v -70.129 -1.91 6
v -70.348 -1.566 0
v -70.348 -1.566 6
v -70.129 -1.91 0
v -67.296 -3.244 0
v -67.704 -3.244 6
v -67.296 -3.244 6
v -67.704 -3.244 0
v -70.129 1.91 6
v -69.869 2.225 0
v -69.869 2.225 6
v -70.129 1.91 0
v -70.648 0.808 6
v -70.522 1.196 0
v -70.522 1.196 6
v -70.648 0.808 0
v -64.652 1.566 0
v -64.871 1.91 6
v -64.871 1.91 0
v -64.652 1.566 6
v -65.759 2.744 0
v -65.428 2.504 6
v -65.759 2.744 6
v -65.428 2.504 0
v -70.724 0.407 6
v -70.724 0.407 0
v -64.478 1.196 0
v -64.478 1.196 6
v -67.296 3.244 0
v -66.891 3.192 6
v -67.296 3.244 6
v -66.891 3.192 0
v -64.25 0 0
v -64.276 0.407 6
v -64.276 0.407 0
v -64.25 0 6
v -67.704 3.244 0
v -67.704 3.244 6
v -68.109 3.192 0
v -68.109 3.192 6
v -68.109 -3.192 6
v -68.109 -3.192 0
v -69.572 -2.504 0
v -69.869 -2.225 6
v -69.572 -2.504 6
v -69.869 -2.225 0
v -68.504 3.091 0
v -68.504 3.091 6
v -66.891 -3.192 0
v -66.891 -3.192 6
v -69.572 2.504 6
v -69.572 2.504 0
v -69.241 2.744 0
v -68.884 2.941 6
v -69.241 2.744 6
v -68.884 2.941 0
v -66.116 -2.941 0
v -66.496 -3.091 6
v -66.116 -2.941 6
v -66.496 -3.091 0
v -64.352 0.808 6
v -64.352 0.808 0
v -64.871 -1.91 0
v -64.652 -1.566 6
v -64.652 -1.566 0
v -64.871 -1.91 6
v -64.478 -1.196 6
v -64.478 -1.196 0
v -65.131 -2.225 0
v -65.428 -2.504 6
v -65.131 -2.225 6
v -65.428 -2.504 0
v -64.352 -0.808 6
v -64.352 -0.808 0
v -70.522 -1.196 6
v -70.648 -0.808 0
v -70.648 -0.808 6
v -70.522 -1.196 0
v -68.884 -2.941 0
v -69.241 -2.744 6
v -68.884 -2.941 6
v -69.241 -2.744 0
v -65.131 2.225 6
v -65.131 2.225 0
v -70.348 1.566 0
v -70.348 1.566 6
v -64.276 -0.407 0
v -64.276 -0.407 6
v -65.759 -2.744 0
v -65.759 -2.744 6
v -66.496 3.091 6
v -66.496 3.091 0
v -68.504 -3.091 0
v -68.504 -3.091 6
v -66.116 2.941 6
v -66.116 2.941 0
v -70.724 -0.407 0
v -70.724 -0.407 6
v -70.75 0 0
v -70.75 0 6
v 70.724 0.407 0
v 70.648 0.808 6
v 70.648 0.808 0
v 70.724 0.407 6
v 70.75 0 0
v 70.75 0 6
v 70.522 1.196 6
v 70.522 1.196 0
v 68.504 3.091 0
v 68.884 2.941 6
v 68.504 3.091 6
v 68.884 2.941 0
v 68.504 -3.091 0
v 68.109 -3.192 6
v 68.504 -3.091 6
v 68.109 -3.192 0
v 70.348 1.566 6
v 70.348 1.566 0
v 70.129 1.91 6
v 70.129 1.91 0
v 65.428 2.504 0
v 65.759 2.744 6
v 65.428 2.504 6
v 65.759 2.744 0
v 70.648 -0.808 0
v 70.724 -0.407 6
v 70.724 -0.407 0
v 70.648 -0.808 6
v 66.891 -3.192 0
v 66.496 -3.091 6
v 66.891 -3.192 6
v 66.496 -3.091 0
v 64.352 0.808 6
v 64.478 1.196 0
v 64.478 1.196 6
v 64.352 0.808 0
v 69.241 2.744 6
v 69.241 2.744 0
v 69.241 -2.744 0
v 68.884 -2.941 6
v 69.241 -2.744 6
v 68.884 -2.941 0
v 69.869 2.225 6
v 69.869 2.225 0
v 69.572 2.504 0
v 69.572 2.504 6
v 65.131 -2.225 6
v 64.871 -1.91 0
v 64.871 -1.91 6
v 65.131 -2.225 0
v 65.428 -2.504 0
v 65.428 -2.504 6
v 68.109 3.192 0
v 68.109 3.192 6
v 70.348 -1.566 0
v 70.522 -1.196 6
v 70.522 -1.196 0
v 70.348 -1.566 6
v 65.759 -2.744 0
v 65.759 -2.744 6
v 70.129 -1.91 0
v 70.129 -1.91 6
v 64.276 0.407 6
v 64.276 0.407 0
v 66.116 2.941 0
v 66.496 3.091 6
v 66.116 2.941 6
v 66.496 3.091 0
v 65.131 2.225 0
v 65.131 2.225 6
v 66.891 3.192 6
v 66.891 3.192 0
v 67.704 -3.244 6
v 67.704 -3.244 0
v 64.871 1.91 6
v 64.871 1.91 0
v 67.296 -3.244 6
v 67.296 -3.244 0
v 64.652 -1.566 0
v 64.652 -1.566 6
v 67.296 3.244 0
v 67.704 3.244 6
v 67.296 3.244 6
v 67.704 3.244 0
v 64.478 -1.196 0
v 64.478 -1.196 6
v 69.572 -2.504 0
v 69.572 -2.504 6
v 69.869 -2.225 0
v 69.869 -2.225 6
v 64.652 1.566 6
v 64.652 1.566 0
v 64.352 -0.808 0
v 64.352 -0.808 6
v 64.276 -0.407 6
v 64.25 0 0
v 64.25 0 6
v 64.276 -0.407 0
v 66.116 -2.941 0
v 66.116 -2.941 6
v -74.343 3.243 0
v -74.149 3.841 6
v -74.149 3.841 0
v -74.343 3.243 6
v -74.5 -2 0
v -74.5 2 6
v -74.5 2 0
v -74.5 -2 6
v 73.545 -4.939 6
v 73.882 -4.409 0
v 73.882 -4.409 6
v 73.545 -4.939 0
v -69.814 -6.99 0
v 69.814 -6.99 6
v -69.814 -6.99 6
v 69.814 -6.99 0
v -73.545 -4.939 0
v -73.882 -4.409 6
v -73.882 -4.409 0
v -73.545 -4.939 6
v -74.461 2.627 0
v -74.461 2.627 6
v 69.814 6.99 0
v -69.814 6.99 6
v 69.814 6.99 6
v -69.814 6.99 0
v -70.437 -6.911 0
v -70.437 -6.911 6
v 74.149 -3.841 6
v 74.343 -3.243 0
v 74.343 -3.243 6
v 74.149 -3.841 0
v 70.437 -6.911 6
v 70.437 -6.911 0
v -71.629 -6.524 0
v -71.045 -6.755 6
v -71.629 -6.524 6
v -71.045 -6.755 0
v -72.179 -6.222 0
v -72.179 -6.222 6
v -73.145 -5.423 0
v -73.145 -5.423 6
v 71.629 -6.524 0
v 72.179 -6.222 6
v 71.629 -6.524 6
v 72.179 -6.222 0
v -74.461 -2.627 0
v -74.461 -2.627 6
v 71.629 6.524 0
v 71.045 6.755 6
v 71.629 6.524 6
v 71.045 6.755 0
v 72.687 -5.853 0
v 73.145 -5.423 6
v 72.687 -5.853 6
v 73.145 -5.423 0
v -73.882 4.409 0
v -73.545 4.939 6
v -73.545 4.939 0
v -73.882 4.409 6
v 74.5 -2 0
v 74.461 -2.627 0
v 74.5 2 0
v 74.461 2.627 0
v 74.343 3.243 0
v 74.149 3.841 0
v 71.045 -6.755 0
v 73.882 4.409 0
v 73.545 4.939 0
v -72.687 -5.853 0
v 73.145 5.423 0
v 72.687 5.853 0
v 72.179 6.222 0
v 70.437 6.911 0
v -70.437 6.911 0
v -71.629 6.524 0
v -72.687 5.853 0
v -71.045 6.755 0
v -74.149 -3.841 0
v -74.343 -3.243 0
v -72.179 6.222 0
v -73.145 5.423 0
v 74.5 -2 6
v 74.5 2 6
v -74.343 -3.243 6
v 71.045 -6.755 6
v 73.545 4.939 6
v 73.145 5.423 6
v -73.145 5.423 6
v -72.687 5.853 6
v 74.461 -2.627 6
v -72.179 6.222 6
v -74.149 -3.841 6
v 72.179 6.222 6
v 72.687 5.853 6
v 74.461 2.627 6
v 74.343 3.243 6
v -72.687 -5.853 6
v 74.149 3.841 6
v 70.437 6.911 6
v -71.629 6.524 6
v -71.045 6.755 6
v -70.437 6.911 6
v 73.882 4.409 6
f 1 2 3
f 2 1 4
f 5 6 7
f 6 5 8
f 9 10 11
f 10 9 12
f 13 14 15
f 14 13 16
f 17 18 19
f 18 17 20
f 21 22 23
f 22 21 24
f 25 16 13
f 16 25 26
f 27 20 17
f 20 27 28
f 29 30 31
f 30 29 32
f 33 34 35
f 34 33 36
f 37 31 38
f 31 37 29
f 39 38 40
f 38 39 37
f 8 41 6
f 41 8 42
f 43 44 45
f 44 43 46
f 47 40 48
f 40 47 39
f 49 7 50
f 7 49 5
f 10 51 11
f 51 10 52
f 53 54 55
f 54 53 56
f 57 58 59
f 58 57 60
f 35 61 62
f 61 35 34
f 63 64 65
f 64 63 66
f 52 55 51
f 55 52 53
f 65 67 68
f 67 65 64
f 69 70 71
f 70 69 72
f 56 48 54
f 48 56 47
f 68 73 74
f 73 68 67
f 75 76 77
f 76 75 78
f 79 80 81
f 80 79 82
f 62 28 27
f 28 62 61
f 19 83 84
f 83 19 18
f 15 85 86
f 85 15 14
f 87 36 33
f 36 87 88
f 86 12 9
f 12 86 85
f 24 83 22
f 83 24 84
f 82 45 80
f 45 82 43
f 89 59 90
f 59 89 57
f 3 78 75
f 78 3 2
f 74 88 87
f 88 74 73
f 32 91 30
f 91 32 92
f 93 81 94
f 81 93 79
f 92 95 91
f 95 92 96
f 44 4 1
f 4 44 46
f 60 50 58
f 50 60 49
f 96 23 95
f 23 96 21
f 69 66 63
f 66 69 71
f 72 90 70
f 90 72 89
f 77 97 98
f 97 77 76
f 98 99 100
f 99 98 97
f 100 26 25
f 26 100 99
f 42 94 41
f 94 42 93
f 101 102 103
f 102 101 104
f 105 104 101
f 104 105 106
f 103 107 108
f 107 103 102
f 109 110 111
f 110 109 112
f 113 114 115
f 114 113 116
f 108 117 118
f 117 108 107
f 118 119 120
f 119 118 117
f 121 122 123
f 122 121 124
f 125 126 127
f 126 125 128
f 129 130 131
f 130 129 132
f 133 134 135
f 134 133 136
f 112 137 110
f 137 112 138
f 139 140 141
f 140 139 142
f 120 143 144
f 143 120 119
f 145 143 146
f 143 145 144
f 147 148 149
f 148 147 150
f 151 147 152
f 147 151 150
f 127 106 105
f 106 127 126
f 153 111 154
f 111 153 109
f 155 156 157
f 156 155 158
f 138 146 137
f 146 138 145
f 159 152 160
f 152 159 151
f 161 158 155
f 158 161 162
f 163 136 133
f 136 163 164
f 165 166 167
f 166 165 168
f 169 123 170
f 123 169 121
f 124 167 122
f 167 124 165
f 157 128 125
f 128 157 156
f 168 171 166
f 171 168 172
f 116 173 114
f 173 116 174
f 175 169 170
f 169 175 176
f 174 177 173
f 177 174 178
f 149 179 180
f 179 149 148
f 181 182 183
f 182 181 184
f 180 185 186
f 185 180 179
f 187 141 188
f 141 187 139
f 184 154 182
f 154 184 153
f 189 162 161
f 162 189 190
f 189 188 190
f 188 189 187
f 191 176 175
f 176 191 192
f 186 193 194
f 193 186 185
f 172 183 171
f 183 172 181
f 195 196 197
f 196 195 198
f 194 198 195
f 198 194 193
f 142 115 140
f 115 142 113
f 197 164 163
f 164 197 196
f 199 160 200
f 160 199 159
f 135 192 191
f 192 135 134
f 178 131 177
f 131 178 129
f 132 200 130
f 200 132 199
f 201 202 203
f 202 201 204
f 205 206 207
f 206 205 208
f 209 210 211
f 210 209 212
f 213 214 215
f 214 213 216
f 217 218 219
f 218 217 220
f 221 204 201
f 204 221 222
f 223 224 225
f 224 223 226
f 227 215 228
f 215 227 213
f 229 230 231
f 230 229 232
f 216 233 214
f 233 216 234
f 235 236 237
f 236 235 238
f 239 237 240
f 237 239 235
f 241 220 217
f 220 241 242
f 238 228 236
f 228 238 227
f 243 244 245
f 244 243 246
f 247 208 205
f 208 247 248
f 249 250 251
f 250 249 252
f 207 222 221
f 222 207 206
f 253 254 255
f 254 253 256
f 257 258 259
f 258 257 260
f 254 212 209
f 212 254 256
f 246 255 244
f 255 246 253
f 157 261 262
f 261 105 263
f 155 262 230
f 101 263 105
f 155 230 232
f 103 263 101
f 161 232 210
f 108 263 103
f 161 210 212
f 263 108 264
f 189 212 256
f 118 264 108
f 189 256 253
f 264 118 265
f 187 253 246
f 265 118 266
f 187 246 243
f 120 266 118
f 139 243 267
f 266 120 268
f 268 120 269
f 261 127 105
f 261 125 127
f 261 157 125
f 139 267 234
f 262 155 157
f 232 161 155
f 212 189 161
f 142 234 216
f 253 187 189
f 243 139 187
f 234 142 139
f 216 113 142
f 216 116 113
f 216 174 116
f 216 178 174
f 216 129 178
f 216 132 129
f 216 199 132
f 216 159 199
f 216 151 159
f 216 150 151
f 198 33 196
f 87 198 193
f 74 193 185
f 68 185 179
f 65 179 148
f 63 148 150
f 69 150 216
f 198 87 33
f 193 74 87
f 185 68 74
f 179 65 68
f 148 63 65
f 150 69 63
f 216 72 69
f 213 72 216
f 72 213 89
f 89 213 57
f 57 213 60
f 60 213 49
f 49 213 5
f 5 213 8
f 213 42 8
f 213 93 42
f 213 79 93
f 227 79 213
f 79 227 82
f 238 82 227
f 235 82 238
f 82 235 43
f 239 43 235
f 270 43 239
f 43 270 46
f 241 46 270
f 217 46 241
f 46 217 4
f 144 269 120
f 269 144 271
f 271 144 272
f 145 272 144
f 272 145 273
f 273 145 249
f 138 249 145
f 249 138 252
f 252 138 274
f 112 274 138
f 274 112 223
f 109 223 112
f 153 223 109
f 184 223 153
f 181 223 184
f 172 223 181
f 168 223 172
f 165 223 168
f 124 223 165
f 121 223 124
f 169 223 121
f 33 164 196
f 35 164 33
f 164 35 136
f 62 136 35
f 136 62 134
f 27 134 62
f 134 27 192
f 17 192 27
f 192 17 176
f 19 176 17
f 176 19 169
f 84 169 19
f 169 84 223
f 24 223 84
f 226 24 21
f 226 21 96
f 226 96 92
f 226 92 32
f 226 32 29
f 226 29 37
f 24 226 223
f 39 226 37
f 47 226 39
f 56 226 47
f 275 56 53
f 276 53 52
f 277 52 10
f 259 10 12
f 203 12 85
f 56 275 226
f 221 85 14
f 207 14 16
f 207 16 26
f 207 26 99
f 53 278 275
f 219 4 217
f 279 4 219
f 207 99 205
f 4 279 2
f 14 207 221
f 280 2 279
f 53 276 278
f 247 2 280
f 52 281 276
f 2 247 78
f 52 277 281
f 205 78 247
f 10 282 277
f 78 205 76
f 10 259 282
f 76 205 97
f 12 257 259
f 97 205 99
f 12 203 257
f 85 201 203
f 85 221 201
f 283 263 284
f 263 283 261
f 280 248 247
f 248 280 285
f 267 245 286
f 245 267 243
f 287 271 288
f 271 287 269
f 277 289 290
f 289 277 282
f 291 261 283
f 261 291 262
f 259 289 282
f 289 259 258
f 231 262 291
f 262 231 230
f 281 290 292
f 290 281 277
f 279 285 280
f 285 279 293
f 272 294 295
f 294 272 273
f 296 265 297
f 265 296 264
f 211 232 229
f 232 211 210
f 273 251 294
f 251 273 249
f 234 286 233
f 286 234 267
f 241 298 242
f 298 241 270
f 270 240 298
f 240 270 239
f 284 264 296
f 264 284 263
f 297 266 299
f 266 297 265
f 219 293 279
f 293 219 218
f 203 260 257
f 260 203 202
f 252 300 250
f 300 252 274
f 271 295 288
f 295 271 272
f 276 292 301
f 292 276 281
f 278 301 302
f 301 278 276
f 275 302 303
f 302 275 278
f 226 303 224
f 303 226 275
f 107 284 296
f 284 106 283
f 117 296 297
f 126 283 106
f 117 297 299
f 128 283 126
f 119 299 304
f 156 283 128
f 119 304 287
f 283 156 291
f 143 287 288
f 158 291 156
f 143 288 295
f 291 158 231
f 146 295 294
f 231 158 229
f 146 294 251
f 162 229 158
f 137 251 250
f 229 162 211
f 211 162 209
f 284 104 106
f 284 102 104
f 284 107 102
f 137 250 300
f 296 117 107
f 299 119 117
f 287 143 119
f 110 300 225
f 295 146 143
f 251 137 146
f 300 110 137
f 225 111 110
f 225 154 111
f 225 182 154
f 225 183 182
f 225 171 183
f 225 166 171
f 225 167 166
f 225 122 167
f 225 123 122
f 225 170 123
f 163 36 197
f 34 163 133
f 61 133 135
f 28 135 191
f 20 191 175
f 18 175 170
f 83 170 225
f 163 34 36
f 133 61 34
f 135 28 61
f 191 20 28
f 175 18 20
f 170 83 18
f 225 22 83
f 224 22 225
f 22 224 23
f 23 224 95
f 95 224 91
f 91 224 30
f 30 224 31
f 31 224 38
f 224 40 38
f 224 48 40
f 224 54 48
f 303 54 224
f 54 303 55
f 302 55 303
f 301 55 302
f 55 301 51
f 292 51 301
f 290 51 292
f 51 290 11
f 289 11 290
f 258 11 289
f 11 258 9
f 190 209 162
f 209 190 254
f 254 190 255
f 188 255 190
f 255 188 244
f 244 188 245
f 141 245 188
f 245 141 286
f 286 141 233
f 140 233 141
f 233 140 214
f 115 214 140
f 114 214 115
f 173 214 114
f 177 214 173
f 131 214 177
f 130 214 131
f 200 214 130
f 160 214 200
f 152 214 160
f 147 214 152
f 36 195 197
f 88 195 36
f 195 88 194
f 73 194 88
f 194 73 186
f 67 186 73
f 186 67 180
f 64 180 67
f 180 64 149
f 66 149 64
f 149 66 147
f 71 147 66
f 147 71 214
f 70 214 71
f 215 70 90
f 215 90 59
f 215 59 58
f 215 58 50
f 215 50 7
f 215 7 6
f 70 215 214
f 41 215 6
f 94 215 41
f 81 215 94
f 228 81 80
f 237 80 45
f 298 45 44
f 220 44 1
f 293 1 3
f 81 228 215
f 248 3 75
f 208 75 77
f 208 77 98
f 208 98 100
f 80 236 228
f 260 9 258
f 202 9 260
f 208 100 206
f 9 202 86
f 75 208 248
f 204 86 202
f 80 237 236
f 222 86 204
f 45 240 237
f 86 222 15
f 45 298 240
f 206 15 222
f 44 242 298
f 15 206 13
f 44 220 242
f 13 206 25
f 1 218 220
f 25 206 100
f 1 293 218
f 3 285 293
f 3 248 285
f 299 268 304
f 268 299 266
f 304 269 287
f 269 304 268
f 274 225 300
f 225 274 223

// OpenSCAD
$fn = 50;


difference() {
	union() {
		hull() {
			translate(v = [-69.5000000000, 2.0000000000, 0]) {
				cylinder(h = 6, r = 5);
			}
			translate(v = [69.5000000000, 2.0000000000, 0]) {
				cylinder(h = 6, r = 5);
			}
			translate(v = [-69.5000000000, -2.0000000000, 0]) {
				cylinder(h = 6, r = 5);
			}
			translate(v = [69.5000000000, -2.0000000000, 0]) {
				cylinder(h = 6, r = 5);
			}
		}
	}
	union() {
		translate(v = [-67.5000000000, 0.0000000000, -100.0000000000]) {
			cylinder(h = 200, r = 3.2500000000);
		}
		translate(v = [-67.5000000000, 0.0000000000, -100.0000000000]) {
			cylinder(h = 200, r = 3.2500000000);
		}
		translate(v = [67.5000000000, 0.0000000000, -100.0000000000]) {
			cylinder(h = 200, r = 3.2500000000);
		}
		translate(v = [67.5000000000, 0.0000000000, -100.0000000000]) {
			cylinder(h = 200, r = 3.2500000000);
		}
	}
}
